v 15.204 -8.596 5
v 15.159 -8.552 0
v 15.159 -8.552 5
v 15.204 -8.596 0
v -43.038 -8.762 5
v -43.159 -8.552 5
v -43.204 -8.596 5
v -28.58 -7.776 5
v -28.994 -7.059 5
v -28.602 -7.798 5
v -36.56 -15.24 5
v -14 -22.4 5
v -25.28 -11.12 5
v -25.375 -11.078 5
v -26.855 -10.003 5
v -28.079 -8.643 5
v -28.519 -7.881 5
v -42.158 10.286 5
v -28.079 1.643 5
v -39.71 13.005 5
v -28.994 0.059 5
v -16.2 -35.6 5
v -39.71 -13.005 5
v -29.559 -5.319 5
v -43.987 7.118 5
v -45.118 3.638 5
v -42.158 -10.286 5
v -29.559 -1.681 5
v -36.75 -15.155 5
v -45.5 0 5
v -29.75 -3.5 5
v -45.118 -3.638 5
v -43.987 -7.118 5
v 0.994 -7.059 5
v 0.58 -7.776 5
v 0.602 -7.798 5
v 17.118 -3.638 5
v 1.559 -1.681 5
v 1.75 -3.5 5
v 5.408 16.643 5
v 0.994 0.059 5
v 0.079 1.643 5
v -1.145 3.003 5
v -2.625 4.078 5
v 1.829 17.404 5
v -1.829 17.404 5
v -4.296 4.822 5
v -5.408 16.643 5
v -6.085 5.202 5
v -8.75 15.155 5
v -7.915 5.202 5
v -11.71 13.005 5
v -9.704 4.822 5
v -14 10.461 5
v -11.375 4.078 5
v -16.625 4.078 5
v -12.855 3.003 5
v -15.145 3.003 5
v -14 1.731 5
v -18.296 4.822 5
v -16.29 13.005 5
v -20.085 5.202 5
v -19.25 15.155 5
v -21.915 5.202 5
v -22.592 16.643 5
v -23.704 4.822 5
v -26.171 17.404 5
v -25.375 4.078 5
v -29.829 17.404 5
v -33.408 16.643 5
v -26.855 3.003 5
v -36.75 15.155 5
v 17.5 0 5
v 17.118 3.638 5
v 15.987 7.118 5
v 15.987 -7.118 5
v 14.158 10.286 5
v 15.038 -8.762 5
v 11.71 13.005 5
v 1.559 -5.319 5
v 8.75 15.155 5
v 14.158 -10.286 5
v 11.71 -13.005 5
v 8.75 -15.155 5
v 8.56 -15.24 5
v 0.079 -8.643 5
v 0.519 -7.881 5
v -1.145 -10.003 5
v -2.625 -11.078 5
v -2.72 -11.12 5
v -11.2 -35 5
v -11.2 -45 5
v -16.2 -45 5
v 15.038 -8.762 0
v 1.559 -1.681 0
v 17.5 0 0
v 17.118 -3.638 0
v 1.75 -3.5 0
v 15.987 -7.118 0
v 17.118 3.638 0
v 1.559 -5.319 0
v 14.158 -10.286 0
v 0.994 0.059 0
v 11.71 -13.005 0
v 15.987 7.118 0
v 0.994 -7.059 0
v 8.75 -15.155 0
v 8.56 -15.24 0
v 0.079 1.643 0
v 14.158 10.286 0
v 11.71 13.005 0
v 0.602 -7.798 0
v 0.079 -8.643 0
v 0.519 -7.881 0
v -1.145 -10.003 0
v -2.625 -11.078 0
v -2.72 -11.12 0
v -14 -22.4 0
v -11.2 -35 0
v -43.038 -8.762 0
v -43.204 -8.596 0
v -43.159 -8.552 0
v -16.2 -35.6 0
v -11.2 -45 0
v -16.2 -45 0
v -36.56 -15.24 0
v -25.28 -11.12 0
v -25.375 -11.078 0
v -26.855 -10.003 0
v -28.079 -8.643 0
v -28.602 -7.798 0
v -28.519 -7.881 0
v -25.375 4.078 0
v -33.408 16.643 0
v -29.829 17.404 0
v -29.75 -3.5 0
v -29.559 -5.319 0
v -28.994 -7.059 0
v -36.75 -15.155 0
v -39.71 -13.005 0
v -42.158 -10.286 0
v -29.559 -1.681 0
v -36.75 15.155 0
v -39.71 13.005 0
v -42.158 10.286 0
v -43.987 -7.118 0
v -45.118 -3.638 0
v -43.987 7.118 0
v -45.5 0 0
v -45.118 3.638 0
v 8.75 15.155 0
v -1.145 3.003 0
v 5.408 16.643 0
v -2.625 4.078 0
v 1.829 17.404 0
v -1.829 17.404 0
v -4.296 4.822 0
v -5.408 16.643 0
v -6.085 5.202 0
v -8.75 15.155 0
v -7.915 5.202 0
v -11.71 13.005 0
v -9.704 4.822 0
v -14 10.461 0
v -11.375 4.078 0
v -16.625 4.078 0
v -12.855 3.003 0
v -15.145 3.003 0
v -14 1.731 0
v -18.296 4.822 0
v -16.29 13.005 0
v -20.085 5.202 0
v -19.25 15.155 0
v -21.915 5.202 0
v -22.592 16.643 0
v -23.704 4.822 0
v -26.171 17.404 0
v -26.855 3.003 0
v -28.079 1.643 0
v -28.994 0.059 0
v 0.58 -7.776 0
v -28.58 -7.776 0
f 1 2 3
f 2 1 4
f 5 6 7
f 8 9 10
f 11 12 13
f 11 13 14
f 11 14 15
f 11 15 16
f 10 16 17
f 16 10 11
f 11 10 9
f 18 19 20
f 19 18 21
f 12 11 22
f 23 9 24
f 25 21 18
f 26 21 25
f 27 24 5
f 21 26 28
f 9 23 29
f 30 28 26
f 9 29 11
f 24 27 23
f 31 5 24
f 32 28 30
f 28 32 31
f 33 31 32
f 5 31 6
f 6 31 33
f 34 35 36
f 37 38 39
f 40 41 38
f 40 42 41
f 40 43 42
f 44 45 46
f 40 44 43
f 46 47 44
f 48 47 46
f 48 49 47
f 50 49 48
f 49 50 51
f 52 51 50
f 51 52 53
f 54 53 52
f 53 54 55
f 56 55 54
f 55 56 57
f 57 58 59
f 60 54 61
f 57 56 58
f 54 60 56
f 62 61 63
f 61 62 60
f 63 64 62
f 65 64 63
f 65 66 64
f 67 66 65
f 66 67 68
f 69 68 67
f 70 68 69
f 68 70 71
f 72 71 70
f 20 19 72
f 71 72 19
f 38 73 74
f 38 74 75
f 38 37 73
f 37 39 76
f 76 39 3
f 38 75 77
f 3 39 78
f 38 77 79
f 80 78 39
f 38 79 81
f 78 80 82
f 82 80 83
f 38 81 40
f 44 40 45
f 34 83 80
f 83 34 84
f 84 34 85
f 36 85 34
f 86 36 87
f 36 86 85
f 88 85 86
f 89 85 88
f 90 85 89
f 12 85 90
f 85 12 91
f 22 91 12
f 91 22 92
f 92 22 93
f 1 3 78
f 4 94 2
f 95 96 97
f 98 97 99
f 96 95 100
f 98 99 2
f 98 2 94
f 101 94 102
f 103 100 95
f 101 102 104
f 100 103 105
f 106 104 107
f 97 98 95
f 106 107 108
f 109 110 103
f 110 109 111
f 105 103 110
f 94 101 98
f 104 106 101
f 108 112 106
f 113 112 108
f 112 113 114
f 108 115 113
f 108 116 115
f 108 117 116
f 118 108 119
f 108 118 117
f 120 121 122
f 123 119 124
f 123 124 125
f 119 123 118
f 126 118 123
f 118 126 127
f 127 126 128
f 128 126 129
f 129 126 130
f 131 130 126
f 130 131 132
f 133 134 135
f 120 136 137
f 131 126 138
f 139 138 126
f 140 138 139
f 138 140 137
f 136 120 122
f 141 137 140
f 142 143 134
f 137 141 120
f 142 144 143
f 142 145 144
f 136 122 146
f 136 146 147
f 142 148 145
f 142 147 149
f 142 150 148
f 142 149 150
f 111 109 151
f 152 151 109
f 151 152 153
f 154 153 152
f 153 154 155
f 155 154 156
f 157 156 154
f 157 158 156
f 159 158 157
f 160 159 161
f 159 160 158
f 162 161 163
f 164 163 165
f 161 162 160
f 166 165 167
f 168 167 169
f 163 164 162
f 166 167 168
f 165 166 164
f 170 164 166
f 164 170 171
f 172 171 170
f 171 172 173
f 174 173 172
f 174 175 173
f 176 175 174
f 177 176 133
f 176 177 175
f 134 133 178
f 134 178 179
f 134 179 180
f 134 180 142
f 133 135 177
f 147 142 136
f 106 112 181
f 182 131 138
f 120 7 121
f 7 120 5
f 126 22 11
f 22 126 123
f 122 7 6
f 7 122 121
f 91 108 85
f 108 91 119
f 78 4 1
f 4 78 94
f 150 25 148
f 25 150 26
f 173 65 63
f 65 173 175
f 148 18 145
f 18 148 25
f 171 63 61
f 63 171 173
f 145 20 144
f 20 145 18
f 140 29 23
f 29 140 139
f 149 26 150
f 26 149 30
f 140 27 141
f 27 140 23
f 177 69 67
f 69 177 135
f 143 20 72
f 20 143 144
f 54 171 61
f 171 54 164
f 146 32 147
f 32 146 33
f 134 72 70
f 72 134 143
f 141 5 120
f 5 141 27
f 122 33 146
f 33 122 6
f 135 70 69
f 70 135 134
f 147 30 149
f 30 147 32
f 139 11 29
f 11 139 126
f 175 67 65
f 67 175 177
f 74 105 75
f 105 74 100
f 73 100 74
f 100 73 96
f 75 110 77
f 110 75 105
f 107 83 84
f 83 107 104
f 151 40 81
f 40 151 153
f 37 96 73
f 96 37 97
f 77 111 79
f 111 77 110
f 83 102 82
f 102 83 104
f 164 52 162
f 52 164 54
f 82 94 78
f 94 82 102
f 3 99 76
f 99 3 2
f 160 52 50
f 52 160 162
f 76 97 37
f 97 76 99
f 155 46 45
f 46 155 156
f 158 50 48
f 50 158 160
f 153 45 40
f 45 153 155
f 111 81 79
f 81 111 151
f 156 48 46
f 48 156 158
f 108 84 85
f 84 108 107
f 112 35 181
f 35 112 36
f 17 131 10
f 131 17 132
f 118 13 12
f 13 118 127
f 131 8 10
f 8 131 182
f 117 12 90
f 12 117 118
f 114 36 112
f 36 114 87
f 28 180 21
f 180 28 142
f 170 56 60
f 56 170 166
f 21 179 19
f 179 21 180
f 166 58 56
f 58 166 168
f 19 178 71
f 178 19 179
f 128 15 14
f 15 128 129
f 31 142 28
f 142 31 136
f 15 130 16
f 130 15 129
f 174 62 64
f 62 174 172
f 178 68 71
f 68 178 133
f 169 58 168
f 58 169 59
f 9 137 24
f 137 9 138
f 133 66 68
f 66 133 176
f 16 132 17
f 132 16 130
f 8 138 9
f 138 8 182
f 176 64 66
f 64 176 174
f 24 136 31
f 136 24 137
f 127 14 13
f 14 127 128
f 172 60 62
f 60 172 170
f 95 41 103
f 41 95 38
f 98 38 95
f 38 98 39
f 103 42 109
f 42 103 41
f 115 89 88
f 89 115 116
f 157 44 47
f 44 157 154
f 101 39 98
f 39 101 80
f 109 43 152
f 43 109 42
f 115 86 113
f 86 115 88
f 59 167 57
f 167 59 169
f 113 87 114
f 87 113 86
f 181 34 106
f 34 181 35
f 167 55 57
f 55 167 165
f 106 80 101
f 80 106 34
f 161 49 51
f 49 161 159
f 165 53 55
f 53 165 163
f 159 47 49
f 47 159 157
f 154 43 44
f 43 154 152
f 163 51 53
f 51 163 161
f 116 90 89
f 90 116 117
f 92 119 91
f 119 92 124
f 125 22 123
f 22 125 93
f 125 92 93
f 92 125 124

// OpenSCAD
union(){
scale([0.7,0.7,1])
difference(){
difference(){
union(){
translate([-40,0,0]) cylinder(5,25,25);
   cylinder(5,25,25);

translate([-20,-54,0]) rotate([0,0,45]) 
difference(){
cube([59,59,5]);
translate([45,45,0]) cube([20,20,5]);
}
}
}
translate([-10,-5,0])
scale([0.5,0.5,1])
difference(){
union(){
translate([-40,0,0]) cylinder(5,25,25);
   cylinder(5,25,25);

translate([-20,-54,0]) rotate([0,0,45]) 
difference(){
cube([59,59,5]);
translate([45,45,0]) cube([20,20,5]);
}
}
}
}
translate([-16.2,-45,0]) cube([5,10,5]);
}
